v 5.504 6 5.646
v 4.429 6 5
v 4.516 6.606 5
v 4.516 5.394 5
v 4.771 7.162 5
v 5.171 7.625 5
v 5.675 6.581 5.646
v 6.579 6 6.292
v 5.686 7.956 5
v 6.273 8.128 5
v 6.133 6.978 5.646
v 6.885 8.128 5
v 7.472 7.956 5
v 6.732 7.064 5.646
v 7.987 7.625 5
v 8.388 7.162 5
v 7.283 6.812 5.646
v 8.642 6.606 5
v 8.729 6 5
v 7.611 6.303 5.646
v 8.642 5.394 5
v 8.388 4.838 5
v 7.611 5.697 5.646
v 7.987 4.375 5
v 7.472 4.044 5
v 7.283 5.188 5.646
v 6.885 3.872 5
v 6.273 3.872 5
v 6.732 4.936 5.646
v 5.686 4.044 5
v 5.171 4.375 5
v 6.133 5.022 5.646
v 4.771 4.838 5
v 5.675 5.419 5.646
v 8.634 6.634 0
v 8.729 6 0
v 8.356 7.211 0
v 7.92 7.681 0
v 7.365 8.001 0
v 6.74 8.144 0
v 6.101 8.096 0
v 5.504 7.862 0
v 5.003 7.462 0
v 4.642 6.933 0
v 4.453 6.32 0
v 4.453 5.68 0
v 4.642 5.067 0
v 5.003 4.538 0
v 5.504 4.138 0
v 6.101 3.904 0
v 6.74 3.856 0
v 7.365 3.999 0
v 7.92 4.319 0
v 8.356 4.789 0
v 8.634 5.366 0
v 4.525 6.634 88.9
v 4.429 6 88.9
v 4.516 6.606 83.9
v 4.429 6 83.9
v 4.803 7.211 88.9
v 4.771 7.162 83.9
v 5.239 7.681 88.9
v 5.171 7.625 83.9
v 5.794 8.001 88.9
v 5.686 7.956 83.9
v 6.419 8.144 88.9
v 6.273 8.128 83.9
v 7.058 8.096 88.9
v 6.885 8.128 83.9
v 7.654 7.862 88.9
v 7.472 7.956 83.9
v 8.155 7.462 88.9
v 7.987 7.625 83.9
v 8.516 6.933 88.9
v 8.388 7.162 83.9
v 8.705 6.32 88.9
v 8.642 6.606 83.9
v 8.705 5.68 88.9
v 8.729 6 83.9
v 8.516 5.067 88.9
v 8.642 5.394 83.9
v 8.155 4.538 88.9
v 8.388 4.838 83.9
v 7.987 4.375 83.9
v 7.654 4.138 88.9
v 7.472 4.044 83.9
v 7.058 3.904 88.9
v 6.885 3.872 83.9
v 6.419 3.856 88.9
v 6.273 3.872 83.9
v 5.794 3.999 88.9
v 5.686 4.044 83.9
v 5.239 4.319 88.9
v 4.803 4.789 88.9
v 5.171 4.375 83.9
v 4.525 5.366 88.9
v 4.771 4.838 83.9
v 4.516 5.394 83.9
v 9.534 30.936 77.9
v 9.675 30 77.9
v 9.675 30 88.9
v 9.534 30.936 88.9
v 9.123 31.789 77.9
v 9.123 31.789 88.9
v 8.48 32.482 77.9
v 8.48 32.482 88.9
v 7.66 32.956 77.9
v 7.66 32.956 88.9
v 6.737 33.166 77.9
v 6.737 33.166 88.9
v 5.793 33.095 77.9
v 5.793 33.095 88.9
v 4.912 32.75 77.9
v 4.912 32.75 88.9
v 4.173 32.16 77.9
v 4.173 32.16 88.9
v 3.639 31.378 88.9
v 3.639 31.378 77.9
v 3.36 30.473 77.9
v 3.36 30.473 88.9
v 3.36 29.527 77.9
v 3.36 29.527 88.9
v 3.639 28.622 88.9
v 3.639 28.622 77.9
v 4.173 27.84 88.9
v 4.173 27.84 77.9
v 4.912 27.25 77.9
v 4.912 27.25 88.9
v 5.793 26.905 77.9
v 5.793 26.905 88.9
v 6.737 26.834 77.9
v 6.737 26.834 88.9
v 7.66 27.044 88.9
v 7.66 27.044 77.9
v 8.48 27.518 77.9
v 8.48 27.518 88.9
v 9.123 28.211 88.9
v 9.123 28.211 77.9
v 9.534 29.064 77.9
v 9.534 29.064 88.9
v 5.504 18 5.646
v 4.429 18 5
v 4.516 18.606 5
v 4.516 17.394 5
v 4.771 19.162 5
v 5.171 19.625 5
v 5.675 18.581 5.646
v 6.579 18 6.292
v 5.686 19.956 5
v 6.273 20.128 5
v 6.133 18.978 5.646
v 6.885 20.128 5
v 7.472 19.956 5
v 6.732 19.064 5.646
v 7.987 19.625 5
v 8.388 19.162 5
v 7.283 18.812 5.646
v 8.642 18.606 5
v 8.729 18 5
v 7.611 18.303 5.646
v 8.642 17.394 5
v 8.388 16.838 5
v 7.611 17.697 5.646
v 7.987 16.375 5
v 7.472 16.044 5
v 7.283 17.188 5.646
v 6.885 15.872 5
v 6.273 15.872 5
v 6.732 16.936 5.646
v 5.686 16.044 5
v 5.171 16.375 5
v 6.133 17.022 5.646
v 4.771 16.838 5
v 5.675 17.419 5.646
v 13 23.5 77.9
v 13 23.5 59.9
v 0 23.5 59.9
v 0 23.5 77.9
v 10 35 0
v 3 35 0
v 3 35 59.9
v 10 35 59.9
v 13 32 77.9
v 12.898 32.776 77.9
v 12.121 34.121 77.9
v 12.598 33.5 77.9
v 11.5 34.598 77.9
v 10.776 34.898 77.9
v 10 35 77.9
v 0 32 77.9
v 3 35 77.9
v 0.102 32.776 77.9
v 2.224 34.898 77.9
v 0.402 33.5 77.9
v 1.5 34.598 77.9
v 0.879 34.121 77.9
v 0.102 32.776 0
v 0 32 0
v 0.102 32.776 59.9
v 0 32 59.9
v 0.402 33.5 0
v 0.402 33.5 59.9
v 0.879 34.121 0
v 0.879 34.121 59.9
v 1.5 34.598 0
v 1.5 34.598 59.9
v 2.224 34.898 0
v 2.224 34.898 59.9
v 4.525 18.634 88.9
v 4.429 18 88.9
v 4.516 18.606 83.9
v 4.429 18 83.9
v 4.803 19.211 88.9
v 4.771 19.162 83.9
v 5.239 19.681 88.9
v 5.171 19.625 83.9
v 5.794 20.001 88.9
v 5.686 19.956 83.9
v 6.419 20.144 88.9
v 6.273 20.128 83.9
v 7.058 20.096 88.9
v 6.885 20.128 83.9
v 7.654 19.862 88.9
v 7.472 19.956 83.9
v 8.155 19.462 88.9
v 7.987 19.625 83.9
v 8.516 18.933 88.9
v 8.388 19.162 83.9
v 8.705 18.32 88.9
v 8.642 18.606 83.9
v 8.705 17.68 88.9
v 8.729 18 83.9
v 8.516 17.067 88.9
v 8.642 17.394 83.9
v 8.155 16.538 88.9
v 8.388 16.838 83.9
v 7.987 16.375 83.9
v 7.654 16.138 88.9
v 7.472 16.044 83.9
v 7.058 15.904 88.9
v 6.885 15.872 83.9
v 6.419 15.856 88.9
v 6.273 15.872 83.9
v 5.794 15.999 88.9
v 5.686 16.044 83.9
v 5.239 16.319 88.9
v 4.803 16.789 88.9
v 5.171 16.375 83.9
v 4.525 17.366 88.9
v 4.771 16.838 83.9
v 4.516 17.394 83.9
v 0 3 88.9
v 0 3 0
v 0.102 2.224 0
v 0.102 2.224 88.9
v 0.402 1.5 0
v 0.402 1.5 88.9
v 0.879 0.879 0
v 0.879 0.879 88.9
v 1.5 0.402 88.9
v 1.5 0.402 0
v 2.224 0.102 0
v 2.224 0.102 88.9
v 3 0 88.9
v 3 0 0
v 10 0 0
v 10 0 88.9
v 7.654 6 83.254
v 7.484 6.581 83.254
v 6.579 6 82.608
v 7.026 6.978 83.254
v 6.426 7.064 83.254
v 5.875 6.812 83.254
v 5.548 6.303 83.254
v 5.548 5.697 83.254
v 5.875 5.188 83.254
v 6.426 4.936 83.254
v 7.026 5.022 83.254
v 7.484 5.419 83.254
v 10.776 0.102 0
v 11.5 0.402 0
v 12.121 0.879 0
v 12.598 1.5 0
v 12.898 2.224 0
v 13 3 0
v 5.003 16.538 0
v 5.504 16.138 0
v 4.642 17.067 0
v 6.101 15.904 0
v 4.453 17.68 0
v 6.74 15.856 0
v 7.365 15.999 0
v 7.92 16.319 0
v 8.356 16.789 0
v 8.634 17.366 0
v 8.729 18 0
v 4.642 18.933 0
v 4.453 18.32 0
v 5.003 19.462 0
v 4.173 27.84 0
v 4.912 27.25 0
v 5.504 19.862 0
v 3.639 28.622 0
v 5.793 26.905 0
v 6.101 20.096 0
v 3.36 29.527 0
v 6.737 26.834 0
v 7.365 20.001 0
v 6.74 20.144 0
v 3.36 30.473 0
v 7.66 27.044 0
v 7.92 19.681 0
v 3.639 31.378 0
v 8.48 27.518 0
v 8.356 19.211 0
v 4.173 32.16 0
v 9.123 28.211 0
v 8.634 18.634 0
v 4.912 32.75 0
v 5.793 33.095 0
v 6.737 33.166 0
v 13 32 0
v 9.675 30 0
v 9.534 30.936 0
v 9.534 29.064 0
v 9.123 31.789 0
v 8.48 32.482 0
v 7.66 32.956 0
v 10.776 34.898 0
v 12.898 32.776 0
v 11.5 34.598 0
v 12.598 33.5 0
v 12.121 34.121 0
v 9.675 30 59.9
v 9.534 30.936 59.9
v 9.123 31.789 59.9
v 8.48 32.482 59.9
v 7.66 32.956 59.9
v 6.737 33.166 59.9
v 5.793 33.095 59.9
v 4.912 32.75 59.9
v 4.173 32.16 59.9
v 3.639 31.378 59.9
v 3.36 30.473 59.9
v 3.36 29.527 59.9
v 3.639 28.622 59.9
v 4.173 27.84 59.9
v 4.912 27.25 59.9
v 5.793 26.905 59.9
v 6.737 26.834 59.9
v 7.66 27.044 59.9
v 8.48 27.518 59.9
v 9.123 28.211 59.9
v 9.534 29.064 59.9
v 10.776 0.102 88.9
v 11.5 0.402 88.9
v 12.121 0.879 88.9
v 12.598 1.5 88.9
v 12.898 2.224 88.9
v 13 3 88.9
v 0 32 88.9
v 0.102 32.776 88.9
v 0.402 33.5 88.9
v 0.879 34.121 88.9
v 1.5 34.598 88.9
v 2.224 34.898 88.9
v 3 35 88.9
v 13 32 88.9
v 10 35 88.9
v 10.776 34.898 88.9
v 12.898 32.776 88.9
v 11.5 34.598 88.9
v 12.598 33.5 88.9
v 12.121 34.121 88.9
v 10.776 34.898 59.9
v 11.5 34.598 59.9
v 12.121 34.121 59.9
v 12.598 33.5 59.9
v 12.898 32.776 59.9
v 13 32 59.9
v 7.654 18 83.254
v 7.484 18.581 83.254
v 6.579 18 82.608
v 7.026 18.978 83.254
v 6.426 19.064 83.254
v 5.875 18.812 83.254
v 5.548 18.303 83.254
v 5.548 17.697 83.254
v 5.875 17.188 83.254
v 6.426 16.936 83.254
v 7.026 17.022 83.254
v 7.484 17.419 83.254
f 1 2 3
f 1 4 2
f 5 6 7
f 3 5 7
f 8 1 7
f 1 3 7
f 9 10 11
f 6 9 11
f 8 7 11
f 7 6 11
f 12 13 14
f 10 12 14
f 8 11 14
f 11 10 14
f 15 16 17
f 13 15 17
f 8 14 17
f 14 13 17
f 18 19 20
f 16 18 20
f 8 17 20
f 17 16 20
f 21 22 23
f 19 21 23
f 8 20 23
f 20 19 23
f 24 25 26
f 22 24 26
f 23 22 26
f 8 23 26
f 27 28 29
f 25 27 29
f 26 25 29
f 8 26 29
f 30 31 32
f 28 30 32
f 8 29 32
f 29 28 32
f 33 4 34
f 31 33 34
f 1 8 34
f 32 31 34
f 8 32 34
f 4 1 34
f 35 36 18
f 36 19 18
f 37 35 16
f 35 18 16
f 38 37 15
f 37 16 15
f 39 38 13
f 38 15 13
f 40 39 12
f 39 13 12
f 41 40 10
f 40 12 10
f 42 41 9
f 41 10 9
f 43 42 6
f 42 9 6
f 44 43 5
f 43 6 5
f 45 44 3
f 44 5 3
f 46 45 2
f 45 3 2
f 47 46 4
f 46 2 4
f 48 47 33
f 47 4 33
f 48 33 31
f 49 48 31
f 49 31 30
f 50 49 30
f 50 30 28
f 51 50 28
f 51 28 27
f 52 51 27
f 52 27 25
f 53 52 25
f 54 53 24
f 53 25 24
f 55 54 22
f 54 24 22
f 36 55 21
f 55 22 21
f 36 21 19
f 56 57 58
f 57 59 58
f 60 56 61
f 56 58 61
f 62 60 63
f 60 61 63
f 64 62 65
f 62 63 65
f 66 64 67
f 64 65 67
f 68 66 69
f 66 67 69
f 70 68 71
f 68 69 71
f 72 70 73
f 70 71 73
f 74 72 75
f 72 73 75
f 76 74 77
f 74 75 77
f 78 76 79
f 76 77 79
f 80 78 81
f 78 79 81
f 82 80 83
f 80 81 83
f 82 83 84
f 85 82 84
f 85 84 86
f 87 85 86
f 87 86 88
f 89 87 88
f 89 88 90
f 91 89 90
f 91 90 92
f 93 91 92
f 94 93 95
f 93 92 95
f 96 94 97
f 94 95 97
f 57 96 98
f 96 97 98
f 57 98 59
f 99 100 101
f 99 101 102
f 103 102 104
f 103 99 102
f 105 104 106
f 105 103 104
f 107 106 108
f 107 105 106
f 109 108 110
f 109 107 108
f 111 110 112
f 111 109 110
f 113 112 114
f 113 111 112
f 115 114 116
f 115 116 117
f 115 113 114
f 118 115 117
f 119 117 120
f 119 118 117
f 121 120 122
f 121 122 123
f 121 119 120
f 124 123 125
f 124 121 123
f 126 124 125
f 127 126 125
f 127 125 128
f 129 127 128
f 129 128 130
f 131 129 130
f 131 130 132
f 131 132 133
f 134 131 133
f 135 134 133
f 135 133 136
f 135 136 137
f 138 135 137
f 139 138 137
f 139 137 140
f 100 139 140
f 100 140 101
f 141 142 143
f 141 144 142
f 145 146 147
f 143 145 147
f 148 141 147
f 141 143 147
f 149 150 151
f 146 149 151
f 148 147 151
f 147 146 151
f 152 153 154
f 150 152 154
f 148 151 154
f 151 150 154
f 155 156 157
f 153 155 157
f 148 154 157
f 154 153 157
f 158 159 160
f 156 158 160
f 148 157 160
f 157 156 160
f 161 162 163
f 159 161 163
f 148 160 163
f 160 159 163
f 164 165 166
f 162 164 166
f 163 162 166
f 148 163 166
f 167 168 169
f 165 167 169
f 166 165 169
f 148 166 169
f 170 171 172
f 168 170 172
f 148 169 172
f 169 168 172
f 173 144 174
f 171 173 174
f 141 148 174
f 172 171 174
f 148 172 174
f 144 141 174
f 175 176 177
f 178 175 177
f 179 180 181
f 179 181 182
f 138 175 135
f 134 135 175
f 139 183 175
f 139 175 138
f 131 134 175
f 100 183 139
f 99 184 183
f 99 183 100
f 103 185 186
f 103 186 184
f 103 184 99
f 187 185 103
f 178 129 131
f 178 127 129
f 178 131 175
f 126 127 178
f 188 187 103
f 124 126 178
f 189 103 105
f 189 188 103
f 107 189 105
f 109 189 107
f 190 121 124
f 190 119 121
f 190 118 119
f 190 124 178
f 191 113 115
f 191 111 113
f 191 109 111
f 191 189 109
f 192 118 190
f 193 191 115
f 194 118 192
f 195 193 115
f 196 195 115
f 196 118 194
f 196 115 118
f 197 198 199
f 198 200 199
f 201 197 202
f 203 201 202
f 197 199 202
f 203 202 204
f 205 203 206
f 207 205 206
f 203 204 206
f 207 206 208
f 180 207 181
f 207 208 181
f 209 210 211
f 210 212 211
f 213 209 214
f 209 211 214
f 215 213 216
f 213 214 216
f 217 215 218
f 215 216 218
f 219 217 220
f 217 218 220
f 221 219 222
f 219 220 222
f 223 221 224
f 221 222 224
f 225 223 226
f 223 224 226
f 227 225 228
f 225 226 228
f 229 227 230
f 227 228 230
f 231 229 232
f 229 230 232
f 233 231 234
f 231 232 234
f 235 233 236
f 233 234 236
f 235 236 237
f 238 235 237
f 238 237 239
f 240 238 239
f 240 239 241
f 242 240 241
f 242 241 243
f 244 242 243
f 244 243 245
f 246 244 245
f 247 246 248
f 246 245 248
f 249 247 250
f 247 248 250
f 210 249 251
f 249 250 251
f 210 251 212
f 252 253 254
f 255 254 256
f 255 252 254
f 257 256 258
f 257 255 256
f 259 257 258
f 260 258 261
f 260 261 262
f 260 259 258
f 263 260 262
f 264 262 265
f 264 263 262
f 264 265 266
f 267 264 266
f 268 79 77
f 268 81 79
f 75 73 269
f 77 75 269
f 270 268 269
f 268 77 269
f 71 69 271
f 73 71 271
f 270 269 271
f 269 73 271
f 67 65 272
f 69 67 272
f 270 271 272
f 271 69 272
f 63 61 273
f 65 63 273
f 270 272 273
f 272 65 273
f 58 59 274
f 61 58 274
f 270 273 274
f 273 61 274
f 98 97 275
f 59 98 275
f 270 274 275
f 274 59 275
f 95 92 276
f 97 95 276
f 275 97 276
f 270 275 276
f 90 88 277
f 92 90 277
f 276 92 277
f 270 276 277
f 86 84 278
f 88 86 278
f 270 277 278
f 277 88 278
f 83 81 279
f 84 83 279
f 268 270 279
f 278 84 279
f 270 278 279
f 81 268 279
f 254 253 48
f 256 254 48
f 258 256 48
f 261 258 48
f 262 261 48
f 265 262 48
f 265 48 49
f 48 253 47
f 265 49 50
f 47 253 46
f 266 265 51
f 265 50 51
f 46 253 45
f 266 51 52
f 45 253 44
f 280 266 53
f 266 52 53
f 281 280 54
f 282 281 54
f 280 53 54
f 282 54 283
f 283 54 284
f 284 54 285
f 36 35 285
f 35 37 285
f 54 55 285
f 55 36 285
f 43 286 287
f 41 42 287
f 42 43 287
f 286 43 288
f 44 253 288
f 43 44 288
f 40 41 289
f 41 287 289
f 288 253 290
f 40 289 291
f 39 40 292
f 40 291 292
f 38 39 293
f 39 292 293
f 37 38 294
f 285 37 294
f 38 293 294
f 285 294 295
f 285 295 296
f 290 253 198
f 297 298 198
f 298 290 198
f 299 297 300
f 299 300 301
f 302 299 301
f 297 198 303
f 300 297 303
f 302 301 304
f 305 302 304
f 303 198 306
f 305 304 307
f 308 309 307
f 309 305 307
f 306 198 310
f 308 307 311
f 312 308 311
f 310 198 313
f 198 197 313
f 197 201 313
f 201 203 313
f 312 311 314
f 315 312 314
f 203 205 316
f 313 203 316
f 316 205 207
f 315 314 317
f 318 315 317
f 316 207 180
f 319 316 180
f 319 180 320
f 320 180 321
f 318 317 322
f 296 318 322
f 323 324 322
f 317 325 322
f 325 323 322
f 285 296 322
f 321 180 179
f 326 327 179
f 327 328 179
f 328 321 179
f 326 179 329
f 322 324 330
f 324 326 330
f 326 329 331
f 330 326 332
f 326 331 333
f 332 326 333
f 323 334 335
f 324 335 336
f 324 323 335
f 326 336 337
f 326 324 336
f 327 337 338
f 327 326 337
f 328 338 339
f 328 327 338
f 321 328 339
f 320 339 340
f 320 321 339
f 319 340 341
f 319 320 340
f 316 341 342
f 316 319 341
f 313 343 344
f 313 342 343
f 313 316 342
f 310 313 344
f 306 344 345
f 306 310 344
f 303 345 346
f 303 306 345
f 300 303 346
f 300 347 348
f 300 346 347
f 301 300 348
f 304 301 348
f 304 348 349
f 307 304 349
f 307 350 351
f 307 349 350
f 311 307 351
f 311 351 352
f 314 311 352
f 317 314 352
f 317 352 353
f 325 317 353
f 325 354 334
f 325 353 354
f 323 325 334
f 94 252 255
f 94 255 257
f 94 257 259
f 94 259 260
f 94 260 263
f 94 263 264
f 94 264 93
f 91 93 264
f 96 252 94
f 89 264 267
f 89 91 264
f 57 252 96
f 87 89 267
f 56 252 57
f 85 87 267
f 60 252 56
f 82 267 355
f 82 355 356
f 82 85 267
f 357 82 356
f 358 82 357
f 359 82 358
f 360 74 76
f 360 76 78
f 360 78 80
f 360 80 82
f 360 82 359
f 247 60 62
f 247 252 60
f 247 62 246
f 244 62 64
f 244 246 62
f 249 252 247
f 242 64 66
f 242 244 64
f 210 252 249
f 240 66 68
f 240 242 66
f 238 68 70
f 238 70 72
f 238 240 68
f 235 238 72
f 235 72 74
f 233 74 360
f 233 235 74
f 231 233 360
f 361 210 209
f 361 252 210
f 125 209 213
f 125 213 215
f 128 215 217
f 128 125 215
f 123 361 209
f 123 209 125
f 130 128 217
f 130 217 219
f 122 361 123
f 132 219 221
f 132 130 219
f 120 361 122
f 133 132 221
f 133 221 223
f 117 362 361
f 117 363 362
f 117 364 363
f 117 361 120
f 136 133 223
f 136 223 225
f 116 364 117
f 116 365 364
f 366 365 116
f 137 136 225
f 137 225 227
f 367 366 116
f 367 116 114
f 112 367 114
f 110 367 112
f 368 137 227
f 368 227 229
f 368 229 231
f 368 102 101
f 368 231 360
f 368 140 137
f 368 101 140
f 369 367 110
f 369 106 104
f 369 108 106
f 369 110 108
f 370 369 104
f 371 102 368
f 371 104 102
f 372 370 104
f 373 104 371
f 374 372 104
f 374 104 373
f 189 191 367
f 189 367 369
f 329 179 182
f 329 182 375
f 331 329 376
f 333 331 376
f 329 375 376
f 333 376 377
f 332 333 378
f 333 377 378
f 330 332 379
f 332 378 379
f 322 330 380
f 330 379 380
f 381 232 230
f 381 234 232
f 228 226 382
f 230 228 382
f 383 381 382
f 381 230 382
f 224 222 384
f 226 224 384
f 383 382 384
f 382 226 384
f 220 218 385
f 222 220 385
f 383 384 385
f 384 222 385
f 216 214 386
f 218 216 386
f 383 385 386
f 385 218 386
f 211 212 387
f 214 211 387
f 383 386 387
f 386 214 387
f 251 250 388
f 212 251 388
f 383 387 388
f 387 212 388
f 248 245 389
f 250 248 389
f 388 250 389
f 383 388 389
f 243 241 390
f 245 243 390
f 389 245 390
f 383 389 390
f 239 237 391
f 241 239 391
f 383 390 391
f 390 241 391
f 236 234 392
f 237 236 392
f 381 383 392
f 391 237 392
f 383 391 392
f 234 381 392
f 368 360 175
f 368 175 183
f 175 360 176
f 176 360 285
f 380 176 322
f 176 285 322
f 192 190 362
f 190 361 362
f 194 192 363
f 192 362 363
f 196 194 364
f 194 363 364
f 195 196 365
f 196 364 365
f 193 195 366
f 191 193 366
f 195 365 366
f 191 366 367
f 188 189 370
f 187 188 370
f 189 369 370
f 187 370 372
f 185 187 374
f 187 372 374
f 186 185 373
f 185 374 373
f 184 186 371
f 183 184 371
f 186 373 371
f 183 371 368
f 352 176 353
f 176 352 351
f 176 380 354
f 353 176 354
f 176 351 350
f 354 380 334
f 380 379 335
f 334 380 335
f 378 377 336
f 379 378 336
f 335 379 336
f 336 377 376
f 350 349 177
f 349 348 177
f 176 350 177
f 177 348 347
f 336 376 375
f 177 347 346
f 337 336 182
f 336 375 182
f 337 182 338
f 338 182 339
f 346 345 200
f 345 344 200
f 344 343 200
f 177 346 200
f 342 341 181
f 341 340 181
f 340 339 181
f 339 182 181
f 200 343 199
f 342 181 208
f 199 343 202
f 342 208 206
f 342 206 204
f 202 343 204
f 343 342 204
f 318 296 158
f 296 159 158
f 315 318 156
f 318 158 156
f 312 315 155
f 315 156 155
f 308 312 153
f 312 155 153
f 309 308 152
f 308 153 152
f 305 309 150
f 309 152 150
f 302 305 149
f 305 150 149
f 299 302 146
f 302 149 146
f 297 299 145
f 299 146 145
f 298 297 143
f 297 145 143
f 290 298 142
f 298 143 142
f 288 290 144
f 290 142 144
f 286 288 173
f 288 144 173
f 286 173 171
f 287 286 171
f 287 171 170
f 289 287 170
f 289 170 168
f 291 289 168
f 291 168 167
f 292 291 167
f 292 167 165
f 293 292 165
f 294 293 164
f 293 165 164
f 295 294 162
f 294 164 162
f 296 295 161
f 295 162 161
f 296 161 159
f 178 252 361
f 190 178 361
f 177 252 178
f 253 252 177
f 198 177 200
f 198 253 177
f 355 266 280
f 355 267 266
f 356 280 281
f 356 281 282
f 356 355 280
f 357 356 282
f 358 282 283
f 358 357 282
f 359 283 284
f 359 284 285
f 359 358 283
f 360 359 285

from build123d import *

# Parameters (mm, degrees)
SKETCH1_W                = 13
SKETCH1_H                = 35
SKETCH1_R                = 3.175
BOSS_EXTRUDE1_DEPTH      = 88.9
CUT_EXTRUDE1_DEPTH       = 9
M4_CLEARANCE_HOLE1_D     = 4.3
M4_CLEARANCE_HOLE1_DEPTH = 5
M4_CLEARANCE_HOLE1_TIP   = 1.291850331
M4_CLEARANCE_HOLE2_D     = 4.3
M4_CLEARANCE_HOLE2_DEPTH = 5
M4_CLEARANCE_HOLE2_TIP   = 1.291850331
FILLET1_R                = 3


with BuildPart() as part:
    # Sketch1 → Boss-Extrude1 (new body)
    with BuildSketch(Plane.XY):
        with Locations((6.5, 17.5)):
            Rectangle(SKETCH1_W, SKETCH1_H)
        with Locations((6.5, 30)):
            Circle(SKETCH1_R, mode=Mode.SUBTRACT)
    extrude(amount=BOSS_EXTRUDE1_DEPTH)

    # Sketch2 → Cut-Extrude1 (cut, symmetric)
    with BuildSketch(Plane.XY.offset(68.9)):
        Polygon((0, 30), (0, 35), (13, 35), (13, 30), (13, 23.5), (0, 23.5), align=None)
    extrude(amount=CUT_EXTRUDE1_DEPTH, both=True, mode=Mode.SUBTRACT)

    # M4 Clearance Hole1
    with Locations(Plane(origin=(0, 0, 0), x_dir=(-1, 0, 0), z_dir=(0, 0, -1))):
        with Locations((-6.579246302, 18), (-6.579246302, 6)):
            Hole(M4_CLEARANCE_HOLE1_D / 2, depth=M4_CLEARANCE_HOLE1_DEPTH)
            with Locations((0, 0, -(M4_CLEARANCE_HOLE1_DEPTH + M4_CLEARANCE_HOLE1_TIP / 2))):  # 118° drill point
                Cone(0, M4_CLEARANCE_HOLE1_D / 2, M4_CLEARANCE_HOLE1_TIP, mode=Mode.SUBTRACT)

    # M4 Clearance Hole2
    with Locations(Plane.XY.offset(88.9)):
        with Locations((6.579246302, 18), (6.579246302, 6)):
            Hole(M4_CLEARANCE_HOLE2_D / 2, depth=M4_CLEARANCE_HOLE2_DEPTH)
            with Locations((0, 0, -(M4_CLEARANCE_HOLE2_DEPTH + M4_CLEARANCE_HOLE2_TIP / 2))):  # 118° drill point
                Cone(0, M4_CLEARANCE_HOLE2_D / 2, M4_CLEARANCE_HOLE2_TIP, mode=Mode.SUBTRACT)

    # Fillet1
    fillet1_edges = [part.edges().sort_by_distance(p)[0] for p in [
        (0, 35, 29.95),
        (13, 35, 29.95),
        (0, 35, 83.4),
        (13, 35, 83.4),
        (13, 0, 44.45),
        (0, 0, 44.45),
    ]]
    fillet(fillet1_edges, radius=FILLET1_R)


solid = part.part
